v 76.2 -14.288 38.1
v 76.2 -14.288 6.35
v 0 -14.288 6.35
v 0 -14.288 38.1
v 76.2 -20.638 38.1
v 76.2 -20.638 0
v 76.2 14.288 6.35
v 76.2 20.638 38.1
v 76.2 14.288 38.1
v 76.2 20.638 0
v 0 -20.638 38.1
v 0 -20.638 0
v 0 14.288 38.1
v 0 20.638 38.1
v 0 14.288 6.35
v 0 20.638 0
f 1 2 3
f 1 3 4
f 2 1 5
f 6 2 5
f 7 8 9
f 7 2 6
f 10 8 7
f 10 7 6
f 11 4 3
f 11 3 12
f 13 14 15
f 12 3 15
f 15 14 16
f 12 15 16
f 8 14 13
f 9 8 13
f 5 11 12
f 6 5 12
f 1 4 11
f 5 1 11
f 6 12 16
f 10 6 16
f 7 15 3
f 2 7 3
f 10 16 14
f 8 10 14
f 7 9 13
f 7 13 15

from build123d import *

# Parameters (mm, degrees)
BOSS_EXTRUDE2_DEPTH = 76.2


with BuildPart() as part:
    # Sketch4 → Boss-Extrude2 (new body)
    with BuildSketch(Plane(origin=(0, 0, 0), x_dir=(0, 0, -1), z_dir=(1, 0, 0))):
        Polygon((0, 0), (0, 20.6375), (-38.1, 20.6375), (-38.1, 14.2875), (-6.35, 14.2875), (-6.35, 0), align=None)
        Polygon((0, -20.6375), (0, 0), (-6.35, 0), (-6.35, -14.2875), (-38.1, -14.2875), (-38.1, -20.6375), align=None)
    extrude(amount=BOSS_EXTRUDE2_DEPTH)


solid = part.part
